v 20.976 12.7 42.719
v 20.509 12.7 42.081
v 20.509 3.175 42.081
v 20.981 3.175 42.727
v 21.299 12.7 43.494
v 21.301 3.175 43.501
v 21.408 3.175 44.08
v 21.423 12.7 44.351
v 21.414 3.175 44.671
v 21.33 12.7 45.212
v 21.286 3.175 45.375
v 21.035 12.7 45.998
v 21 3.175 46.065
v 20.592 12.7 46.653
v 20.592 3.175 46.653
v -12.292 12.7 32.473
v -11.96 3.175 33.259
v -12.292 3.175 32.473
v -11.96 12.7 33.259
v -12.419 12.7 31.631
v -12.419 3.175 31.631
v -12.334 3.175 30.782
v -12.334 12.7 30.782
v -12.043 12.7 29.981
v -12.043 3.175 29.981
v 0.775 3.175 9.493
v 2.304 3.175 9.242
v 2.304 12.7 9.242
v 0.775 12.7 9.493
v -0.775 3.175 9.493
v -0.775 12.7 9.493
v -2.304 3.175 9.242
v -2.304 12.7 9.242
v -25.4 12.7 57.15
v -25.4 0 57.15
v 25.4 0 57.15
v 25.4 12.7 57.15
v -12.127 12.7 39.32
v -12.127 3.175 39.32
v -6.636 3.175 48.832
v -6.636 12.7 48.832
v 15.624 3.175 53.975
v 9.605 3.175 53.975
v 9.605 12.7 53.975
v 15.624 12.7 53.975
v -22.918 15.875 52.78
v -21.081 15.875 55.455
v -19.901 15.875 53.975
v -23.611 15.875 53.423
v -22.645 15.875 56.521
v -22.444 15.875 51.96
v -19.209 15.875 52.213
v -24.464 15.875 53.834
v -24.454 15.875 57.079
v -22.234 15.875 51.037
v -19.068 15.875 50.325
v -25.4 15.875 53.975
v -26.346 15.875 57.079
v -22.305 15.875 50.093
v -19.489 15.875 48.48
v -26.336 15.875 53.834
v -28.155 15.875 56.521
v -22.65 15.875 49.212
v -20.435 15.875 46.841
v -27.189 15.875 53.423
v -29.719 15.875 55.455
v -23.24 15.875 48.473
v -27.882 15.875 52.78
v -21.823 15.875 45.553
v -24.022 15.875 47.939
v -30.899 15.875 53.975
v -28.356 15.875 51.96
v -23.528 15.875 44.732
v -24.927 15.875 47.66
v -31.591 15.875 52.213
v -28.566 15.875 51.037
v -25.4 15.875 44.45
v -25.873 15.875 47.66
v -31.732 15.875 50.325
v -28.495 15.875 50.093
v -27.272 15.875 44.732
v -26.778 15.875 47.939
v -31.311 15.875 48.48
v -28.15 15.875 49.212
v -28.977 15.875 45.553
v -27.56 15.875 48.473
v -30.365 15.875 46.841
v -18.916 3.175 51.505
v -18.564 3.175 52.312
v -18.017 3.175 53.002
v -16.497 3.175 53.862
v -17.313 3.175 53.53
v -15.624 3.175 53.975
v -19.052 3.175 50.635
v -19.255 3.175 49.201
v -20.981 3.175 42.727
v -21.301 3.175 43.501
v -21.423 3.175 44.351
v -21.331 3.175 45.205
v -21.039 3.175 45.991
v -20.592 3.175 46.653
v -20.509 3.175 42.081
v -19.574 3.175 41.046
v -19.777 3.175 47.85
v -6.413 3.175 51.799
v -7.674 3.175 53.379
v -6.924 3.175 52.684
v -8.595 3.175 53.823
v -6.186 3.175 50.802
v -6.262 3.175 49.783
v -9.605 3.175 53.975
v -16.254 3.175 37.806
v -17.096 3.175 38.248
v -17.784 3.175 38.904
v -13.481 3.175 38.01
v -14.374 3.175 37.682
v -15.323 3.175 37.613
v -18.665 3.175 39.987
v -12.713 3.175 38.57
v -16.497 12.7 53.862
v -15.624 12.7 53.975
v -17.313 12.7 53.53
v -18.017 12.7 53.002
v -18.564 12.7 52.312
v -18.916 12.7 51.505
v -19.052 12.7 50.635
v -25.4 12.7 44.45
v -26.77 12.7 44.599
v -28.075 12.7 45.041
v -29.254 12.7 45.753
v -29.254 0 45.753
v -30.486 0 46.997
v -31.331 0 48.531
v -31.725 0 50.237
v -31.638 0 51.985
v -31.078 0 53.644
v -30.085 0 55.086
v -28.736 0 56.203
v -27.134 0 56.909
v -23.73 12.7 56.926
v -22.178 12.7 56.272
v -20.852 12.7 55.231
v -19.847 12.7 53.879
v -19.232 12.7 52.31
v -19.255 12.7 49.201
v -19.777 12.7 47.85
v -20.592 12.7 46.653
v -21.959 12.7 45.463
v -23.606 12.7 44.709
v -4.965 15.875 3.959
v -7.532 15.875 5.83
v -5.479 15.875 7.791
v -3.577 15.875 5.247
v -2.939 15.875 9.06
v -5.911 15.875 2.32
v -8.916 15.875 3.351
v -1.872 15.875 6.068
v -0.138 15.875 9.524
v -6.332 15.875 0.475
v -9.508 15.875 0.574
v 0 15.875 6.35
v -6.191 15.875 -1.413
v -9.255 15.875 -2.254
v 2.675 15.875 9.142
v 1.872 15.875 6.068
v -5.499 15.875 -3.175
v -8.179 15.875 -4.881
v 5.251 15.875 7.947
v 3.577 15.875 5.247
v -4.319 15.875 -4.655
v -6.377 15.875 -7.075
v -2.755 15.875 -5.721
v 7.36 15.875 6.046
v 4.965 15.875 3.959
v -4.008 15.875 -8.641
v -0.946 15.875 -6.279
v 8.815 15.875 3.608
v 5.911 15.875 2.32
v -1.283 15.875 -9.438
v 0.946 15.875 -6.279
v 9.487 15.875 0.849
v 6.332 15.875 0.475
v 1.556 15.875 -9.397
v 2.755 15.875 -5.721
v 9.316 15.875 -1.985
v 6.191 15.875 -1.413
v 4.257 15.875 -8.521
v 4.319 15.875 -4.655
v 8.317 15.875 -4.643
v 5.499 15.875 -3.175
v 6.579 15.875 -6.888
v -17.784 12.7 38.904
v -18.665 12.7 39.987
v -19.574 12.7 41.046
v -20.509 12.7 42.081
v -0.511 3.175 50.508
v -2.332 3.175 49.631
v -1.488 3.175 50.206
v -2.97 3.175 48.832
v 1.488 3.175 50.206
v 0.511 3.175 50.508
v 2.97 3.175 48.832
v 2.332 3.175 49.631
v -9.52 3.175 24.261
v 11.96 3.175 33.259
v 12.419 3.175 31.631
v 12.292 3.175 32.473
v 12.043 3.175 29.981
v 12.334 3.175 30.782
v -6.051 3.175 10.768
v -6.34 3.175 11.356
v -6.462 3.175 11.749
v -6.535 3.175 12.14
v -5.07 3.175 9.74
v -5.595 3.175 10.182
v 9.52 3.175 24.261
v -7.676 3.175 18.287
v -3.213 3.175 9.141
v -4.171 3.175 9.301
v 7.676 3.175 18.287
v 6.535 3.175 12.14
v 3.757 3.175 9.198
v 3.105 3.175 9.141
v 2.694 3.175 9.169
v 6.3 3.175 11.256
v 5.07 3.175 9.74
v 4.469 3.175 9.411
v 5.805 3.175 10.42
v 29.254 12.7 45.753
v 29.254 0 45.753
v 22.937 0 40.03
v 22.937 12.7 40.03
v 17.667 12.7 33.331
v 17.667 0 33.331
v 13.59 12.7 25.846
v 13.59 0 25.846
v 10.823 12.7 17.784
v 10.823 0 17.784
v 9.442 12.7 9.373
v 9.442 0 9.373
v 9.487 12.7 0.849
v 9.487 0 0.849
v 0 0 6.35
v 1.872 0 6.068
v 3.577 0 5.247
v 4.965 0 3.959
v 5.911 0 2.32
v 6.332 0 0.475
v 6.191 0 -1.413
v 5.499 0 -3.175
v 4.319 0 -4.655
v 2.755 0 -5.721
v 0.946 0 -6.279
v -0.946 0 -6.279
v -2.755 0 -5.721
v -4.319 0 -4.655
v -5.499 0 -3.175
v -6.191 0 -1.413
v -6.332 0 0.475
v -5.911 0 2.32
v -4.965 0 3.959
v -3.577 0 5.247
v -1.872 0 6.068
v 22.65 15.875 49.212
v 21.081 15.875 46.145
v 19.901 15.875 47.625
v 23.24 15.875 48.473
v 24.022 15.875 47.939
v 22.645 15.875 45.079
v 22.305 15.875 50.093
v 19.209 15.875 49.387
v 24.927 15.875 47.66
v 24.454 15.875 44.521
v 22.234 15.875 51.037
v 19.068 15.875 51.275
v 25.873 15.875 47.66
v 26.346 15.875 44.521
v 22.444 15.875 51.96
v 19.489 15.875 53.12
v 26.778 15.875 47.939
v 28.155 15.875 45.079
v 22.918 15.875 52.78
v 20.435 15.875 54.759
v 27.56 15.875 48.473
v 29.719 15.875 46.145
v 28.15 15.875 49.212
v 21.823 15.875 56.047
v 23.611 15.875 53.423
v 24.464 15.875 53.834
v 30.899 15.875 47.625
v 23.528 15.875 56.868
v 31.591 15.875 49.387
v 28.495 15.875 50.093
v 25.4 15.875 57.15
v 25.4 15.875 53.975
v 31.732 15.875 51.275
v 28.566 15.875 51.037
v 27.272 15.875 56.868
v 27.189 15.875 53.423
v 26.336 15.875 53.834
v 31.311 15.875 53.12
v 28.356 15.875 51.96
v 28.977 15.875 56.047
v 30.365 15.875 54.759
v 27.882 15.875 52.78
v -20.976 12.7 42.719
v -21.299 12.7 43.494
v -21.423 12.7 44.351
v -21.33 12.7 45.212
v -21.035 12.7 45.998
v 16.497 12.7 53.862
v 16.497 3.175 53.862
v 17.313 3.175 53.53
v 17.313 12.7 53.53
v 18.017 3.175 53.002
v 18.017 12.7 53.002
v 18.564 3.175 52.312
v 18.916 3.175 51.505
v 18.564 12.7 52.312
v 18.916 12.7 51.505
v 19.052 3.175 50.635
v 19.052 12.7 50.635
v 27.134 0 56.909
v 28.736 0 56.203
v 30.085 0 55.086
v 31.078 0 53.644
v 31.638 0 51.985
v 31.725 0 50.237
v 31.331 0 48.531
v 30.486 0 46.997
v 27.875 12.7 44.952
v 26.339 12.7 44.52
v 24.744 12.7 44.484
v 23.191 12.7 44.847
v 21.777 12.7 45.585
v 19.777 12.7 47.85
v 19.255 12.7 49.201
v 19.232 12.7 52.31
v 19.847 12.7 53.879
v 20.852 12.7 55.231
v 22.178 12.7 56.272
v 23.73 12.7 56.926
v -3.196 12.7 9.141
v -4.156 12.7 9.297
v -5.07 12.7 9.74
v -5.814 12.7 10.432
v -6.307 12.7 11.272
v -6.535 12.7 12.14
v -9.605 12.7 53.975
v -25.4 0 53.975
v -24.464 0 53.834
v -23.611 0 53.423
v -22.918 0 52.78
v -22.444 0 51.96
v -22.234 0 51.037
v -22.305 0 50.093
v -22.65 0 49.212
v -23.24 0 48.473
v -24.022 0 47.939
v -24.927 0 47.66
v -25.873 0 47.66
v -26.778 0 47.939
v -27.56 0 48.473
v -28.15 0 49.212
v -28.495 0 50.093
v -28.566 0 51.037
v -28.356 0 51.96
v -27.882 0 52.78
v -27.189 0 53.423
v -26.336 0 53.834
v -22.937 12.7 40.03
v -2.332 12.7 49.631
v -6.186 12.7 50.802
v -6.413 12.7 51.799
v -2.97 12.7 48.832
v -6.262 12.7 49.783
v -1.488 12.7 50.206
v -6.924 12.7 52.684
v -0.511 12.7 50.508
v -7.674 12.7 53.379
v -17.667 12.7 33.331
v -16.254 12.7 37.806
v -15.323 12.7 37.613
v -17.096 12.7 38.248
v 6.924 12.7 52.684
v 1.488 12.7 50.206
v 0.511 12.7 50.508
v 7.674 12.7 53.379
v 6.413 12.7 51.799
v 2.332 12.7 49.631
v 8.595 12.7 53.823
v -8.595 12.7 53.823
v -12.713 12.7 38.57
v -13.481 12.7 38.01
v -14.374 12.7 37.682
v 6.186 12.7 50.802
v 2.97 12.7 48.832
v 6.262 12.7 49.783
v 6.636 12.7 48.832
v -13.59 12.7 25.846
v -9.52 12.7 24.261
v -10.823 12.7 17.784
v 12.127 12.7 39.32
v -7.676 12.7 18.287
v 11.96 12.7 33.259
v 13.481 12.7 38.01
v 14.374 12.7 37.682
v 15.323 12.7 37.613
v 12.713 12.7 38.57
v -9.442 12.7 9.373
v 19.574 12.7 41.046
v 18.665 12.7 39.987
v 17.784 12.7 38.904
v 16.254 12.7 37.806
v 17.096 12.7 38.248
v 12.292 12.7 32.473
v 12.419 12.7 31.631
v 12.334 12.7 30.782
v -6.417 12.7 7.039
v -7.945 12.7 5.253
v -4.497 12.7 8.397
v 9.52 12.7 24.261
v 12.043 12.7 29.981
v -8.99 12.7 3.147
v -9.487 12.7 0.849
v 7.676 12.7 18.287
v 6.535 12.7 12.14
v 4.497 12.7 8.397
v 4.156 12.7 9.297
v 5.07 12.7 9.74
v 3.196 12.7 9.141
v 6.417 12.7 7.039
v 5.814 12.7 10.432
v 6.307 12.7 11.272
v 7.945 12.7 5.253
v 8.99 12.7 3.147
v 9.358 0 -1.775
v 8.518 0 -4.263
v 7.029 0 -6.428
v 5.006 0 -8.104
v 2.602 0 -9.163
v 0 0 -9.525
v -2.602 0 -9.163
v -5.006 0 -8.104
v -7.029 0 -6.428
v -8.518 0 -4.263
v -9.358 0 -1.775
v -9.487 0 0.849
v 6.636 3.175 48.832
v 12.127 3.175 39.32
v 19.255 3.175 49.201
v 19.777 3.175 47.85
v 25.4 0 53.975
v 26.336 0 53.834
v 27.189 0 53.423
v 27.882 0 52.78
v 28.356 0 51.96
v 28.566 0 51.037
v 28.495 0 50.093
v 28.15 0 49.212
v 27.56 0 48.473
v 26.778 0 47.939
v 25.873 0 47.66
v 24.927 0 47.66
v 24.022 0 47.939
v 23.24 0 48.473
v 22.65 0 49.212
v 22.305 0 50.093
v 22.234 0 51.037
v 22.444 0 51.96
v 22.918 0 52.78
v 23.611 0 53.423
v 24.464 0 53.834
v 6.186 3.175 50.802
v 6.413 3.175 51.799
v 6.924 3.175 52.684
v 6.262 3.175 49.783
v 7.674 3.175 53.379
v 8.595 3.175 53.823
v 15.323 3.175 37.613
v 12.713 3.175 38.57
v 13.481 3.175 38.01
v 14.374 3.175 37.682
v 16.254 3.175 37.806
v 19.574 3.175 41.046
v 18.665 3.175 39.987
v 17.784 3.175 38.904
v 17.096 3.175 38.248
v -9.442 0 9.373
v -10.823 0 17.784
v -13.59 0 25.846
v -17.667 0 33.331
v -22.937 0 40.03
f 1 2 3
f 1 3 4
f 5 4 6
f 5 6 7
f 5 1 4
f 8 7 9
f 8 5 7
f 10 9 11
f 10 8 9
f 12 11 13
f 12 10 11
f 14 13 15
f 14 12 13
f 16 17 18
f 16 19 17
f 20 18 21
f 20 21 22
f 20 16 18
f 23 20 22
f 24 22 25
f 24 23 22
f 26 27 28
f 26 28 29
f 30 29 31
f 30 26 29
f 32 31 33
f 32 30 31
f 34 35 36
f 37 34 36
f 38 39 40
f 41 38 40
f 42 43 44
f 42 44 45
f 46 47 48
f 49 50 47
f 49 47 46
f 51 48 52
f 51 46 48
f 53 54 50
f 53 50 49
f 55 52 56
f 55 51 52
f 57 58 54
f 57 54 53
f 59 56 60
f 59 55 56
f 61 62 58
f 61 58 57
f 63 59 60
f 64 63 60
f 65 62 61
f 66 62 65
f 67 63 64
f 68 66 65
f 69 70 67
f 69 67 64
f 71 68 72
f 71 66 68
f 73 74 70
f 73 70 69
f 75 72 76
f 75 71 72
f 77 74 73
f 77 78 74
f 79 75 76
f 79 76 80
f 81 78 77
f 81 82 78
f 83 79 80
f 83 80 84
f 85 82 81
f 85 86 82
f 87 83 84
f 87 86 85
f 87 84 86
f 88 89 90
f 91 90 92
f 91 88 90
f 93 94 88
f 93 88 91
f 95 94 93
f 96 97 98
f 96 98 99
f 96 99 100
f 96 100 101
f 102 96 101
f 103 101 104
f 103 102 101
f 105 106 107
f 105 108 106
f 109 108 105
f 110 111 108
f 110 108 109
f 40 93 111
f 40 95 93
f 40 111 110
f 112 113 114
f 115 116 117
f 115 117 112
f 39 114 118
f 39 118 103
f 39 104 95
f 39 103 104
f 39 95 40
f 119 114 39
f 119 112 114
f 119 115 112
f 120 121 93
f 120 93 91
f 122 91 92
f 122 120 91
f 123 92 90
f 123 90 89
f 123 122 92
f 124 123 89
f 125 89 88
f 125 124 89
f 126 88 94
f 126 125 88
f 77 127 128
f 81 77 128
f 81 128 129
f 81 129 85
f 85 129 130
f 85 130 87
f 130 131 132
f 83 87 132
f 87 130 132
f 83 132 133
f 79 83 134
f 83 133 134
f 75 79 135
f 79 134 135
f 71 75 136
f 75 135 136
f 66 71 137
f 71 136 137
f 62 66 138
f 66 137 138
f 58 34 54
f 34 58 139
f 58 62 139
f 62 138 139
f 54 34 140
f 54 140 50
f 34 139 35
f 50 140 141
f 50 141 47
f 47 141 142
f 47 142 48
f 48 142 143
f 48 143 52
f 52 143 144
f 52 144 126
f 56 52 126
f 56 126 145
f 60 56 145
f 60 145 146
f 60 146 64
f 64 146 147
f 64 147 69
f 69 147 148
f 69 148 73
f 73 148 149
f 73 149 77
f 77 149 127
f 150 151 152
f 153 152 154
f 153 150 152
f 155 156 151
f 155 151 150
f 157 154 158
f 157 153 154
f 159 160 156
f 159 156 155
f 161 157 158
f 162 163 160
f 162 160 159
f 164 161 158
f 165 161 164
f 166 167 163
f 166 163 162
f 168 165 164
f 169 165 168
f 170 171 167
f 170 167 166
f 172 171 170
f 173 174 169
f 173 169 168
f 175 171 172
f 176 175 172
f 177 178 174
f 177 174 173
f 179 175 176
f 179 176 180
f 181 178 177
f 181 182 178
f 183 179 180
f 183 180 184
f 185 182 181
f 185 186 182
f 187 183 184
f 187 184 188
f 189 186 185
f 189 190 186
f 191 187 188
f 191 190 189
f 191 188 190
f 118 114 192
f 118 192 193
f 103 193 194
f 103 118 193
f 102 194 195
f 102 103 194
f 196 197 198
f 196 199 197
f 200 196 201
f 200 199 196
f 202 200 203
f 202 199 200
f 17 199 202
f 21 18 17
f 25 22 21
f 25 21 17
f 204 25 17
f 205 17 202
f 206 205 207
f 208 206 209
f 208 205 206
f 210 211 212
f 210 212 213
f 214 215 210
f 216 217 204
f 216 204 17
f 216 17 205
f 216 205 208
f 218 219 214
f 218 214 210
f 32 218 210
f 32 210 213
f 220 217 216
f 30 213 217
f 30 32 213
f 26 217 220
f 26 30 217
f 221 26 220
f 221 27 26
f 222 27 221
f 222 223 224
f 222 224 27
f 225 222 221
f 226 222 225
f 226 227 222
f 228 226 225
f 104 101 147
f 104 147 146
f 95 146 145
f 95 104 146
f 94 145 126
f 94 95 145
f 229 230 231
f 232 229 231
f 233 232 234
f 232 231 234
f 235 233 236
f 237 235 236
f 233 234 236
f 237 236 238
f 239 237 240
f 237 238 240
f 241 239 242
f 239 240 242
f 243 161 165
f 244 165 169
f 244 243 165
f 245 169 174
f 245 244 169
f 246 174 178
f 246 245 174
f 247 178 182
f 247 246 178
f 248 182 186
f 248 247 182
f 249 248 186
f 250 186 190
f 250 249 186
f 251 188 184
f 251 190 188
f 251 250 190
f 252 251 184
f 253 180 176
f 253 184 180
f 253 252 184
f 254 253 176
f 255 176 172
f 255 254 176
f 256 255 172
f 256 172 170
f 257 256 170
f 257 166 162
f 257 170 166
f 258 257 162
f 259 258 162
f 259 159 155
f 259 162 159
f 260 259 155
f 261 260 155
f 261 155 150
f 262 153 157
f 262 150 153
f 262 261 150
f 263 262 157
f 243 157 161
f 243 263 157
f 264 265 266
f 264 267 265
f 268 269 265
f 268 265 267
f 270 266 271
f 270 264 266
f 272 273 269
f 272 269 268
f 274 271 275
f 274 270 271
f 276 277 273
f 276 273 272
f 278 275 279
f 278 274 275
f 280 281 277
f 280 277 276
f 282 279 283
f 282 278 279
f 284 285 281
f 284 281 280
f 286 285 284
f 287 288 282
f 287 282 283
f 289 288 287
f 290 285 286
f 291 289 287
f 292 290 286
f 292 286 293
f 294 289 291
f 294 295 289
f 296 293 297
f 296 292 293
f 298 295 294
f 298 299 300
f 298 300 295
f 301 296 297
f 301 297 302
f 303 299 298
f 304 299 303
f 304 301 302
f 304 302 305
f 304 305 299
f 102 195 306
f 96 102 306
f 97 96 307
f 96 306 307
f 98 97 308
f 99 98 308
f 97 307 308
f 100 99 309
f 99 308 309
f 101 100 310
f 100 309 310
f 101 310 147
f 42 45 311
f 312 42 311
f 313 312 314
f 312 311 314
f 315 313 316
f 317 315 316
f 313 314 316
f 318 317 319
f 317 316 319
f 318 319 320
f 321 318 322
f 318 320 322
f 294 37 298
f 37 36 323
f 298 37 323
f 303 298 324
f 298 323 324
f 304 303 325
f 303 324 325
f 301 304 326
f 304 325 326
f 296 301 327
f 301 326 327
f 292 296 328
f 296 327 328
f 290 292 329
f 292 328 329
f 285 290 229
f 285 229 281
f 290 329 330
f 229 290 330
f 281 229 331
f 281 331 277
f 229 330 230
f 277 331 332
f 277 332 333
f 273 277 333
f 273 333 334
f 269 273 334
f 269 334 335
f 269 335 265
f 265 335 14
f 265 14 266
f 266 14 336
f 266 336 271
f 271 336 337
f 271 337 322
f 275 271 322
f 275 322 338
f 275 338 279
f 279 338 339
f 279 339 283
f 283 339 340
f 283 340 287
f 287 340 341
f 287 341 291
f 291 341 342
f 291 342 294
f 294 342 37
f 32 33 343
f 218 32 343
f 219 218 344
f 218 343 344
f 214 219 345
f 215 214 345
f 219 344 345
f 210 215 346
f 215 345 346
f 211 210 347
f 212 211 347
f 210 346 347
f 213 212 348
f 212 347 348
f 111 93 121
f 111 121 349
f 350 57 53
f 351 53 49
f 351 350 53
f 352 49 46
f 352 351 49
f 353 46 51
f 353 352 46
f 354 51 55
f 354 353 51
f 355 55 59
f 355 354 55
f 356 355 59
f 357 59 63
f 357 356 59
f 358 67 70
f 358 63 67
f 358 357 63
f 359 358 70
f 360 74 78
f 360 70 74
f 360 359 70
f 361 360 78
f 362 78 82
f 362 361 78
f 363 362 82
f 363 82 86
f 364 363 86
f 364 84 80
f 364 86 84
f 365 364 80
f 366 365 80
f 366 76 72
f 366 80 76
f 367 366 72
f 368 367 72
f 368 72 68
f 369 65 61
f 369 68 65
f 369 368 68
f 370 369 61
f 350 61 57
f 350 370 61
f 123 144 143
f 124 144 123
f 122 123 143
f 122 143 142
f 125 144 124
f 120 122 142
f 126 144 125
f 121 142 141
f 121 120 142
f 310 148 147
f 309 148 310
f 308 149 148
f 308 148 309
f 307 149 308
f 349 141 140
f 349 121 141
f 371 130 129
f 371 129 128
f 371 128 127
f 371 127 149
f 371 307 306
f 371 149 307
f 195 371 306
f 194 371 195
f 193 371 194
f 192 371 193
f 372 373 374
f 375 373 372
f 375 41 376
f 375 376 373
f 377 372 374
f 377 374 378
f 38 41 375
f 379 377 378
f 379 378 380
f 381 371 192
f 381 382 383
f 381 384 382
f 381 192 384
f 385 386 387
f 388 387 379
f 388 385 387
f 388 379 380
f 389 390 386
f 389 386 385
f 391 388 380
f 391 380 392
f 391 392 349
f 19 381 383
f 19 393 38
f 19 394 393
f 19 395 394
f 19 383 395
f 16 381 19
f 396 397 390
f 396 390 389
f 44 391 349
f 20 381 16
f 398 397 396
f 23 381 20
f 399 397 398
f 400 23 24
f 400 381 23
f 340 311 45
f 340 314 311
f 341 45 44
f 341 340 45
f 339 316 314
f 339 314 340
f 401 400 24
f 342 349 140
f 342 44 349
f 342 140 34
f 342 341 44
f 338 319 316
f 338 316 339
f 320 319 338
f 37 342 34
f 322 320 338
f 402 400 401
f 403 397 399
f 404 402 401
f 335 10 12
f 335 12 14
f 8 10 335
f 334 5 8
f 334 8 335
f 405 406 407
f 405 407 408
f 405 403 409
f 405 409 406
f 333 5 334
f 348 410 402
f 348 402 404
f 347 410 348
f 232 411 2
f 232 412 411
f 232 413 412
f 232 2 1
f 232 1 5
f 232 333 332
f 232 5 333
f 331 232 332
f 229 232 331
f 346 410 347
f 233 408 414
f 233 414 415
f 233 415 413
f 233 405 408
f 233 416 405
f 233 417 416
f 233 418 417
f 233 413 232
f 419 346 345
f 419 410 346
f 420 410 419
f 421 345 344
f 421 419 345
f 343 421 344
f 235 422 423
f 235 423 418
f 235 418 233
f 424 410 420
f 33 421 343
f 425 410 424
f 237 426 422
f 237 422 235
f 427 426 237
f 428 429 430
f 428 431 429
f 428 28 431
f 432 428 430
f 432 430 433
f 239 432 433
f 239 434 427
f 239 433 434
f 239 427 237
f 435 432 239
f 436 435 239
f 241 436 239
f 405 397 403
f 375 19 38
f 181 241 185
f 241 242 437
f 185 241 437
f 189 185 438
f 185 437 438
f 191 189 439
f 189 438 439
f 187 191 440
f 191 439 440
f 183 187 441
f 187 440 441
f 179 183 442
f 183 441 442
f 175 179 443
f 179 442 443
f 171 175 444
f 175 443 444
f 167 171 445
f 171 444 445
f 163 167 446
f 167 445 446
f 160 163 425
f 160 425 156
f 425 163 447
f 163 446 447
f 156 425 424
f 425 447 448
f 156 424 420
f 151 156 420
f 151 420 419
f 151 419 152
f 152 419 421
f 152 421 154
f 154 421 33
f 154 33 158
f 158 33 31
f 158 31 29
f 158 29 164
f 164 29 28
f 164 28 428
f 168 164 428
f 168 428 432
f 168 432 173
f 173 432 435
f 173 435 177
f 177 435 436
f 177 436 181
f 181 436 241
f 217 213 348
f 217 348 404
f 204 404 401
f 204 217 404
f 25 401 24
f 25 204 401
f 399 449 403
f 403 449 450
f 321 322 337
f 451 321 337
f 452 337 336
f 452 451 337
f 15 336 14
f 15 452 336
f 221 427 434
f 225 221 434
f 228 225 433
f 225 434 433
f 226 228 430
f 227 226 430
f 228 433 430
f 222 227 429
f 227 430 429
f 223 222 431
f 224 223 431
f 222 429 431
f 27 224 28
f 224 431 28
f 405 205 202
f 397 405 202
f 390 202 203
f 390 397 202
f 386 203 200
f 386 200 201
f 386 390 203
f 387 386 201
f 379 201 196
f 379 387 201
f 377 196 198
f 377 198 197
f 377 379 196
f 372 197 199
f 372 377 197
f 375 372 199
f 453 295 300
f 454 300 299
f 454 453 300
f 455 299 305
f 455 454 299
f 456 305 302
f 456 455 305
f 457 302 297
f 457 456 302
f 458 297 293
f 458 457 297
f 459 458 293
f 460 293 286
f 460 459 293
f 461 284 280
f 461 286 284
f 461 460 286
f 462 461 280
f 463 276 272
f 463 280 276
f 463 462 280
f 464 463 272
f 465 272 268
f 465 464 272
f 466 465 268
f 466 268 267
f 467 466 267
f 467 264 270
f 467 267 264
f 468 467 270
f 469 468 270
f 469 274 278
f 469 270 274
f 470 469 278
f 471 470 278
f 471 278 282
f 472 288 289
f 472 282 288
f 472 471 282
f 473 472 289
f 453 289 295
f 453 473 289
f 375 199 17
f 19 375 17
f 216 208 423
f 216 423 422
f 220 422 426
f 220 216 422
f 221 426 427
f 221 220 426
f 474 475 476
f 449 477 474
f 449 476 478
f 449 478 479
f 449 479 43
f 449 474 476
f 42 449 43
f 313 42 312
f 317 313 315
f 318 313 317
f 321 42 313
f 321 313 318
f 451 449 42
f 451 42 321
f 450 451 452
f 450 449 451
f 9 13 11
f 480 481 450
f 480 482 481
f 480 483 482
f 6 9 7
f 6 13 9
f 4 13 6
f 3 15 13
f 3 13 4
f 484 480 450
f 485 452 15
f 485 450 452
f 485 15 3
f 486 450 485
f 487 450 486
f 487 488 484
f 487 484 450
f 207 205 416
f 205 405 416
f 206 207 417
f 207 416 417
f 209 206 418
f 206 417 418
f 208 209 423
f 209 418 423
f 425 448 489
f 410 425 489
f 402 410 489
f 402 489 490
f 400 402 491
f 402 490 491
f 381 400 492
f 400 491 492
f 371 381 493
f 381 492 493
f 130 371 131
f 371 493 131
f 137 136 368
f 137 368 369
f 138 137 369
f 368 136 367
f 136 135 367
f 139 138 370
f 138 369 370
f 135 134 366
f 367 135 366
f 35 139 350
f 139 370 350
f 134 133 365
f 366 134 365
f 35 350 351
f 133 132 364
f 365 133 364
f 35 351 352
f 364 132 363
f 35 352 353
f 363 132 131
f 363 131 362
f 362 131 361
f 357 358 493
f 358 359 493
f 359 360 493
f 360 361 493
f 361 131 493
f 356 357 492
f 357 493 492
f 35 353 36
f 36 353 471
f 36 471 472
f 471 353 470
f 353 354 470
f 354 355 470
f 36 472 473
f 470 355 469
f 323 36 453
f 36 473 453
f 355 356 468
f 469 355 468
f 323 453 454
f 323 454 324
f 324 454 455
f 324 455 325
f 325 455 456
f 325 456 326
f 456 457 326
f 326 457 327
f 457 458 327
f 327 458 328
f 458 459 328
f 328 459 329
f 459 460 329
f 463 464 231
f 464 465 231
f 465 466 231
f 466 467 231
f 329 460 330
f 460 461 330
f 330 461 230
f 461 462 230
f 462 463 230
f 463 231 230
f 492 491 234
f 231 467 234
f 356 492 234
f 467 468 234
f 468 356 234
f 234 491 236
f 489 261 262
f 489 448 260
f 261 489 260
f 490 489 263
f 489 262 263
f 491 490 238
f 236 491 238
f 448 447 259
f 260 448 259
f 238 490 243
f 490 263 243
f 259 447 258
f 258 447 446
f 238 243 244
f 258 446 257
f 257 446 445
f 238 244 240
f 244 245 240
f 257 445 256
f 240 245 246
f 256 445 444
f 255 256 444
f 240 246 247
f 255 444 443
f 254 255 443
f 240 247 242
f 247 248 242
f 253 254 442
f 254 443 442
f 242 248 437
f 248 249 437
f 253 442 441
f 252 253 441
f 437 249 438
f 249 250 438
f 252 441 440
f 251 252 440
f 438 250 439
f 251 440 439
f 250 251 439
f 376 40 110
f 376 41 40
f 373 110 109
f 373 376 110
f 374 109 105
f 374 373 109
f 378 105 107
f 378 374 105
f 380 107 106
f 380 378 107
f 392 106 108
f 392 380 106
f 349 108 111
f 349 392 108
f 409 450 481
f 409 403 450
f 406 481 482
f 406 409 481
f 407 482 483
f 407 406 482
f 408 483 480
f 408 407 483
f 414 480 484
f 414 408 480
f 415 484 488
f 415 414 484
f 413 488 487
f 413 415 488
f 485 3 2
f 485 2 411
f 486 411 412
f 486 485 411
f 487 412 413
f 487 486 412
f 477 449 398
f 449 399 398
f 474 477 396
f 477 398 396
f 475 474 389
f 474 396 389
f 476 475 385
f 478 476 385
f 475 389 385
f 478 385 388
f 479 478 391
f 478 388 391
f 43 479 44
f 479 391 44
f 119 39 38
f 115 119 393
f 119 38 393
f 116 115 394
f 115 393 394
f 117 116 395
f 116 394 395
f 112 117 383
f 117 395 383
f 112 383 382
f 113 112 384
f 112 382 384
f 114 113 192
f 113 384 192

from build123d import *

# Parameters (mm, degrees)
BOSS_EXTRUDE1_DEPTH = 12.7
OUTSIDE_CIRLCES_R   = 9.525
OUTSIDE_CIRLCES_R_2 = 6.35
BOSS_EXTRUDE2_DEPTH = 15.875
SKETCH2_R           = 6.35
SKETCH2_R_2         = 3.175
CUT_EXTRUDE2_DEPTH  = 68.277043819
SHELL1_START        = 3.175
SHELL1_DEPTH        = 9.525
RIB1_START          = -9.525
RIB1_DEPTH          = 9.525
FILLET1_R           = 3.429


# Read off the part's stored shape, not the designer's step: Shell1, Rib1
with BuildPart() as part:
    # Sketch1 → Boss-Extrude1 (new body)
    with BuildSketch(Plane(origin=(0, 0, 0), x_dir=(1, 0, 0), z_dir=(0, 1, 0))):
        with BuildLine():
            Line((-25.4, -57.15), (25.4, -57.15))
            ThreePointArc((25.4, -57.15), (31.415385717, -52.834117665), (29.253859008, -45.753192024))
            ThreePointArc((29.253859008, -45.753192024), (13.590190704, -25.845719106), (9.487062801, -0.849272876))
            ThreePointArc((9.487062801, -0.849272876), (0, 9.525), (-9.487062801, -0.849272876))
            ThreePointArc((-9.487062801, -0.849272876), (-13.590190704, -25.845719106), (-29.253859008, -45.753192024))
            ThreePointArc((-29.253859008, -45.753192024), (-31.415385717, -52.834117665), (-25.4, -57.15))
        make_face()
    extrude(amount=BOSS_EXTRUDE1_DEPTH)

    # Outside Cirlces → Boss-Extrude2 (add)
    with BuildSketch(Plane(origin=(0, 0, 0), x_dir=(1, 0, 0), z_dir=(0, 1, 0))):
        with Locations(Location((0, 0, 0), (0, 0, 354.884571445))):
            Circle(OUTSIDE_CIRLCES_R)
        with Locations(Location((25.4, -50.8, 0), (0, 0, 270))):
            Circle(OUTSIDE_CIRLCES_R_2)
        with Locations(Location((-25.4, -50.8, 0), (0, 0, 90))):
            Circle(OUTSIDE_CIRLCES_R_2)
    extrude(amount=BOSS_EXTRUDE2_DEPTH)

    # Sketch2 → Cut-Extrude2 (cut, through all)
    with BuildSketch(Plane(origin=(0, 0, 0), x_dir=(1, 0, 0), z_dir=(0, 1, 0))):
        with Locations(Location((0, 0, 0), (0, 0, 270))):
            Circle(SKETCH2_R)
        with Locations(Location((-25.4, -50.8, 0), (0, 0, 270))):
            Circle(SKETCH2_R_2)
        with Locations(Location((25.4, -50.8, 0), (0, 0, 270))):
            Circle(SKETCH2_R_2)
    extrude(amount=CUT_EXTRUDE2_DEPTH, mode=Mode.SUBTRACT)

    # Shell1 outline → Shell1 (cut)
    with BuildSketch(Plane(origin=(0, 0, 0), x_dir=(1, 0, 0), z_dir=(0, 1, 0)).offset(SHELL1_START)):
        with BuildLine():
            ThreePointArc((-23.245193613, -44.826783996), (-19.436053982, -48.61966794), (-19.900738686, -53.975))
            Line((-19.900738686, -53.975), (19.900738686, -53.975))
            ThreePointArc((19.900738686, -53.975), (19.436053982, -48.61966794), (23.245193613, -44.826783996))
            ThreePointArc((23.245193613, -44.826783996), (10.964919098, -27.751584466), (6.1431994, -7.279198179))
            ThreePointArc((6.1431994, -7.279198179), (0, -9.525), (-6.1431994, -7.279198179))
            ThreePointArc((-6.1431994, -7.279198179), (-10.964919098, -27.751584466), (-23.245193613, -44.826783996))
        make_face()
    extrude(amount=SHELL1_DEPTH, mode=Mode.SUBTRACT)

    # Rib1 outline → Rib1 (add)
    with BuildSketch(Plane(origin=(0, 12.7, 0), x_dir=(1, 0, 0), z_dir=(0, 1, 0)).offset(RIB1_START)):
        with BuildLine():
            Line((12.912461206, -31.609961141), (0, -53.975))
            Line((0, -53.975), (3.666174209, -53.975))
            Line((3.666174209, -53.975), (14.782281631, -34.721337162))
            ThreePointArc((14.782281631, -34.721337162), (13.82120772, -33.181372554), (12.912461206, -31.609961141))
        make_face()
        with BuildLine():
            Line((0, -53.975), (-12.912461206, -31.609961141))
            ThreePointArc((-12.912461206, -31.609961141), (-13.82120772, -33.181372554), (-14.782281631, -34.721337162))
            Line((-14.782281631, -34.721337162), (-3.666174209, -53.975))
            Line((-3.666174209, -53.975), (0, -53.975))
        make_face()
    extrude(amount=RIB1_DEPTH)

    # Fillet1
    fillet1_edges = [part.edges().sort_by_distance(p)[0] for p in [
        (-12.912461206, 7.9375, 31.609961141),
        (-3.666174209, 7.9375, 53.975),
        (-14.782281631, 7.9375, 34.721337162),
        (14.782281631, 7.9375, 34.721337162),
        (3.666174209, 7.9375, 53.975),
        (0, 7.9375, 53.975),
        (12.912461206, 7.9375, 31.609961141),
        (-6.1431994, 7.9375, 7.279198179),
        (-19.900738686, 7.9375, 53.975),
        (23.245193613, 7.9375, 44.826783996),
        (6.1431994, 7.9375, 7.279198179),
        (-23.245193613, 7.9375, 44.826783996),
        (19.900738686, 7.9375, 53.975),
    ]]
    fillet(fillet1_edges, radius=FILLET1_R)


solid = part.part
